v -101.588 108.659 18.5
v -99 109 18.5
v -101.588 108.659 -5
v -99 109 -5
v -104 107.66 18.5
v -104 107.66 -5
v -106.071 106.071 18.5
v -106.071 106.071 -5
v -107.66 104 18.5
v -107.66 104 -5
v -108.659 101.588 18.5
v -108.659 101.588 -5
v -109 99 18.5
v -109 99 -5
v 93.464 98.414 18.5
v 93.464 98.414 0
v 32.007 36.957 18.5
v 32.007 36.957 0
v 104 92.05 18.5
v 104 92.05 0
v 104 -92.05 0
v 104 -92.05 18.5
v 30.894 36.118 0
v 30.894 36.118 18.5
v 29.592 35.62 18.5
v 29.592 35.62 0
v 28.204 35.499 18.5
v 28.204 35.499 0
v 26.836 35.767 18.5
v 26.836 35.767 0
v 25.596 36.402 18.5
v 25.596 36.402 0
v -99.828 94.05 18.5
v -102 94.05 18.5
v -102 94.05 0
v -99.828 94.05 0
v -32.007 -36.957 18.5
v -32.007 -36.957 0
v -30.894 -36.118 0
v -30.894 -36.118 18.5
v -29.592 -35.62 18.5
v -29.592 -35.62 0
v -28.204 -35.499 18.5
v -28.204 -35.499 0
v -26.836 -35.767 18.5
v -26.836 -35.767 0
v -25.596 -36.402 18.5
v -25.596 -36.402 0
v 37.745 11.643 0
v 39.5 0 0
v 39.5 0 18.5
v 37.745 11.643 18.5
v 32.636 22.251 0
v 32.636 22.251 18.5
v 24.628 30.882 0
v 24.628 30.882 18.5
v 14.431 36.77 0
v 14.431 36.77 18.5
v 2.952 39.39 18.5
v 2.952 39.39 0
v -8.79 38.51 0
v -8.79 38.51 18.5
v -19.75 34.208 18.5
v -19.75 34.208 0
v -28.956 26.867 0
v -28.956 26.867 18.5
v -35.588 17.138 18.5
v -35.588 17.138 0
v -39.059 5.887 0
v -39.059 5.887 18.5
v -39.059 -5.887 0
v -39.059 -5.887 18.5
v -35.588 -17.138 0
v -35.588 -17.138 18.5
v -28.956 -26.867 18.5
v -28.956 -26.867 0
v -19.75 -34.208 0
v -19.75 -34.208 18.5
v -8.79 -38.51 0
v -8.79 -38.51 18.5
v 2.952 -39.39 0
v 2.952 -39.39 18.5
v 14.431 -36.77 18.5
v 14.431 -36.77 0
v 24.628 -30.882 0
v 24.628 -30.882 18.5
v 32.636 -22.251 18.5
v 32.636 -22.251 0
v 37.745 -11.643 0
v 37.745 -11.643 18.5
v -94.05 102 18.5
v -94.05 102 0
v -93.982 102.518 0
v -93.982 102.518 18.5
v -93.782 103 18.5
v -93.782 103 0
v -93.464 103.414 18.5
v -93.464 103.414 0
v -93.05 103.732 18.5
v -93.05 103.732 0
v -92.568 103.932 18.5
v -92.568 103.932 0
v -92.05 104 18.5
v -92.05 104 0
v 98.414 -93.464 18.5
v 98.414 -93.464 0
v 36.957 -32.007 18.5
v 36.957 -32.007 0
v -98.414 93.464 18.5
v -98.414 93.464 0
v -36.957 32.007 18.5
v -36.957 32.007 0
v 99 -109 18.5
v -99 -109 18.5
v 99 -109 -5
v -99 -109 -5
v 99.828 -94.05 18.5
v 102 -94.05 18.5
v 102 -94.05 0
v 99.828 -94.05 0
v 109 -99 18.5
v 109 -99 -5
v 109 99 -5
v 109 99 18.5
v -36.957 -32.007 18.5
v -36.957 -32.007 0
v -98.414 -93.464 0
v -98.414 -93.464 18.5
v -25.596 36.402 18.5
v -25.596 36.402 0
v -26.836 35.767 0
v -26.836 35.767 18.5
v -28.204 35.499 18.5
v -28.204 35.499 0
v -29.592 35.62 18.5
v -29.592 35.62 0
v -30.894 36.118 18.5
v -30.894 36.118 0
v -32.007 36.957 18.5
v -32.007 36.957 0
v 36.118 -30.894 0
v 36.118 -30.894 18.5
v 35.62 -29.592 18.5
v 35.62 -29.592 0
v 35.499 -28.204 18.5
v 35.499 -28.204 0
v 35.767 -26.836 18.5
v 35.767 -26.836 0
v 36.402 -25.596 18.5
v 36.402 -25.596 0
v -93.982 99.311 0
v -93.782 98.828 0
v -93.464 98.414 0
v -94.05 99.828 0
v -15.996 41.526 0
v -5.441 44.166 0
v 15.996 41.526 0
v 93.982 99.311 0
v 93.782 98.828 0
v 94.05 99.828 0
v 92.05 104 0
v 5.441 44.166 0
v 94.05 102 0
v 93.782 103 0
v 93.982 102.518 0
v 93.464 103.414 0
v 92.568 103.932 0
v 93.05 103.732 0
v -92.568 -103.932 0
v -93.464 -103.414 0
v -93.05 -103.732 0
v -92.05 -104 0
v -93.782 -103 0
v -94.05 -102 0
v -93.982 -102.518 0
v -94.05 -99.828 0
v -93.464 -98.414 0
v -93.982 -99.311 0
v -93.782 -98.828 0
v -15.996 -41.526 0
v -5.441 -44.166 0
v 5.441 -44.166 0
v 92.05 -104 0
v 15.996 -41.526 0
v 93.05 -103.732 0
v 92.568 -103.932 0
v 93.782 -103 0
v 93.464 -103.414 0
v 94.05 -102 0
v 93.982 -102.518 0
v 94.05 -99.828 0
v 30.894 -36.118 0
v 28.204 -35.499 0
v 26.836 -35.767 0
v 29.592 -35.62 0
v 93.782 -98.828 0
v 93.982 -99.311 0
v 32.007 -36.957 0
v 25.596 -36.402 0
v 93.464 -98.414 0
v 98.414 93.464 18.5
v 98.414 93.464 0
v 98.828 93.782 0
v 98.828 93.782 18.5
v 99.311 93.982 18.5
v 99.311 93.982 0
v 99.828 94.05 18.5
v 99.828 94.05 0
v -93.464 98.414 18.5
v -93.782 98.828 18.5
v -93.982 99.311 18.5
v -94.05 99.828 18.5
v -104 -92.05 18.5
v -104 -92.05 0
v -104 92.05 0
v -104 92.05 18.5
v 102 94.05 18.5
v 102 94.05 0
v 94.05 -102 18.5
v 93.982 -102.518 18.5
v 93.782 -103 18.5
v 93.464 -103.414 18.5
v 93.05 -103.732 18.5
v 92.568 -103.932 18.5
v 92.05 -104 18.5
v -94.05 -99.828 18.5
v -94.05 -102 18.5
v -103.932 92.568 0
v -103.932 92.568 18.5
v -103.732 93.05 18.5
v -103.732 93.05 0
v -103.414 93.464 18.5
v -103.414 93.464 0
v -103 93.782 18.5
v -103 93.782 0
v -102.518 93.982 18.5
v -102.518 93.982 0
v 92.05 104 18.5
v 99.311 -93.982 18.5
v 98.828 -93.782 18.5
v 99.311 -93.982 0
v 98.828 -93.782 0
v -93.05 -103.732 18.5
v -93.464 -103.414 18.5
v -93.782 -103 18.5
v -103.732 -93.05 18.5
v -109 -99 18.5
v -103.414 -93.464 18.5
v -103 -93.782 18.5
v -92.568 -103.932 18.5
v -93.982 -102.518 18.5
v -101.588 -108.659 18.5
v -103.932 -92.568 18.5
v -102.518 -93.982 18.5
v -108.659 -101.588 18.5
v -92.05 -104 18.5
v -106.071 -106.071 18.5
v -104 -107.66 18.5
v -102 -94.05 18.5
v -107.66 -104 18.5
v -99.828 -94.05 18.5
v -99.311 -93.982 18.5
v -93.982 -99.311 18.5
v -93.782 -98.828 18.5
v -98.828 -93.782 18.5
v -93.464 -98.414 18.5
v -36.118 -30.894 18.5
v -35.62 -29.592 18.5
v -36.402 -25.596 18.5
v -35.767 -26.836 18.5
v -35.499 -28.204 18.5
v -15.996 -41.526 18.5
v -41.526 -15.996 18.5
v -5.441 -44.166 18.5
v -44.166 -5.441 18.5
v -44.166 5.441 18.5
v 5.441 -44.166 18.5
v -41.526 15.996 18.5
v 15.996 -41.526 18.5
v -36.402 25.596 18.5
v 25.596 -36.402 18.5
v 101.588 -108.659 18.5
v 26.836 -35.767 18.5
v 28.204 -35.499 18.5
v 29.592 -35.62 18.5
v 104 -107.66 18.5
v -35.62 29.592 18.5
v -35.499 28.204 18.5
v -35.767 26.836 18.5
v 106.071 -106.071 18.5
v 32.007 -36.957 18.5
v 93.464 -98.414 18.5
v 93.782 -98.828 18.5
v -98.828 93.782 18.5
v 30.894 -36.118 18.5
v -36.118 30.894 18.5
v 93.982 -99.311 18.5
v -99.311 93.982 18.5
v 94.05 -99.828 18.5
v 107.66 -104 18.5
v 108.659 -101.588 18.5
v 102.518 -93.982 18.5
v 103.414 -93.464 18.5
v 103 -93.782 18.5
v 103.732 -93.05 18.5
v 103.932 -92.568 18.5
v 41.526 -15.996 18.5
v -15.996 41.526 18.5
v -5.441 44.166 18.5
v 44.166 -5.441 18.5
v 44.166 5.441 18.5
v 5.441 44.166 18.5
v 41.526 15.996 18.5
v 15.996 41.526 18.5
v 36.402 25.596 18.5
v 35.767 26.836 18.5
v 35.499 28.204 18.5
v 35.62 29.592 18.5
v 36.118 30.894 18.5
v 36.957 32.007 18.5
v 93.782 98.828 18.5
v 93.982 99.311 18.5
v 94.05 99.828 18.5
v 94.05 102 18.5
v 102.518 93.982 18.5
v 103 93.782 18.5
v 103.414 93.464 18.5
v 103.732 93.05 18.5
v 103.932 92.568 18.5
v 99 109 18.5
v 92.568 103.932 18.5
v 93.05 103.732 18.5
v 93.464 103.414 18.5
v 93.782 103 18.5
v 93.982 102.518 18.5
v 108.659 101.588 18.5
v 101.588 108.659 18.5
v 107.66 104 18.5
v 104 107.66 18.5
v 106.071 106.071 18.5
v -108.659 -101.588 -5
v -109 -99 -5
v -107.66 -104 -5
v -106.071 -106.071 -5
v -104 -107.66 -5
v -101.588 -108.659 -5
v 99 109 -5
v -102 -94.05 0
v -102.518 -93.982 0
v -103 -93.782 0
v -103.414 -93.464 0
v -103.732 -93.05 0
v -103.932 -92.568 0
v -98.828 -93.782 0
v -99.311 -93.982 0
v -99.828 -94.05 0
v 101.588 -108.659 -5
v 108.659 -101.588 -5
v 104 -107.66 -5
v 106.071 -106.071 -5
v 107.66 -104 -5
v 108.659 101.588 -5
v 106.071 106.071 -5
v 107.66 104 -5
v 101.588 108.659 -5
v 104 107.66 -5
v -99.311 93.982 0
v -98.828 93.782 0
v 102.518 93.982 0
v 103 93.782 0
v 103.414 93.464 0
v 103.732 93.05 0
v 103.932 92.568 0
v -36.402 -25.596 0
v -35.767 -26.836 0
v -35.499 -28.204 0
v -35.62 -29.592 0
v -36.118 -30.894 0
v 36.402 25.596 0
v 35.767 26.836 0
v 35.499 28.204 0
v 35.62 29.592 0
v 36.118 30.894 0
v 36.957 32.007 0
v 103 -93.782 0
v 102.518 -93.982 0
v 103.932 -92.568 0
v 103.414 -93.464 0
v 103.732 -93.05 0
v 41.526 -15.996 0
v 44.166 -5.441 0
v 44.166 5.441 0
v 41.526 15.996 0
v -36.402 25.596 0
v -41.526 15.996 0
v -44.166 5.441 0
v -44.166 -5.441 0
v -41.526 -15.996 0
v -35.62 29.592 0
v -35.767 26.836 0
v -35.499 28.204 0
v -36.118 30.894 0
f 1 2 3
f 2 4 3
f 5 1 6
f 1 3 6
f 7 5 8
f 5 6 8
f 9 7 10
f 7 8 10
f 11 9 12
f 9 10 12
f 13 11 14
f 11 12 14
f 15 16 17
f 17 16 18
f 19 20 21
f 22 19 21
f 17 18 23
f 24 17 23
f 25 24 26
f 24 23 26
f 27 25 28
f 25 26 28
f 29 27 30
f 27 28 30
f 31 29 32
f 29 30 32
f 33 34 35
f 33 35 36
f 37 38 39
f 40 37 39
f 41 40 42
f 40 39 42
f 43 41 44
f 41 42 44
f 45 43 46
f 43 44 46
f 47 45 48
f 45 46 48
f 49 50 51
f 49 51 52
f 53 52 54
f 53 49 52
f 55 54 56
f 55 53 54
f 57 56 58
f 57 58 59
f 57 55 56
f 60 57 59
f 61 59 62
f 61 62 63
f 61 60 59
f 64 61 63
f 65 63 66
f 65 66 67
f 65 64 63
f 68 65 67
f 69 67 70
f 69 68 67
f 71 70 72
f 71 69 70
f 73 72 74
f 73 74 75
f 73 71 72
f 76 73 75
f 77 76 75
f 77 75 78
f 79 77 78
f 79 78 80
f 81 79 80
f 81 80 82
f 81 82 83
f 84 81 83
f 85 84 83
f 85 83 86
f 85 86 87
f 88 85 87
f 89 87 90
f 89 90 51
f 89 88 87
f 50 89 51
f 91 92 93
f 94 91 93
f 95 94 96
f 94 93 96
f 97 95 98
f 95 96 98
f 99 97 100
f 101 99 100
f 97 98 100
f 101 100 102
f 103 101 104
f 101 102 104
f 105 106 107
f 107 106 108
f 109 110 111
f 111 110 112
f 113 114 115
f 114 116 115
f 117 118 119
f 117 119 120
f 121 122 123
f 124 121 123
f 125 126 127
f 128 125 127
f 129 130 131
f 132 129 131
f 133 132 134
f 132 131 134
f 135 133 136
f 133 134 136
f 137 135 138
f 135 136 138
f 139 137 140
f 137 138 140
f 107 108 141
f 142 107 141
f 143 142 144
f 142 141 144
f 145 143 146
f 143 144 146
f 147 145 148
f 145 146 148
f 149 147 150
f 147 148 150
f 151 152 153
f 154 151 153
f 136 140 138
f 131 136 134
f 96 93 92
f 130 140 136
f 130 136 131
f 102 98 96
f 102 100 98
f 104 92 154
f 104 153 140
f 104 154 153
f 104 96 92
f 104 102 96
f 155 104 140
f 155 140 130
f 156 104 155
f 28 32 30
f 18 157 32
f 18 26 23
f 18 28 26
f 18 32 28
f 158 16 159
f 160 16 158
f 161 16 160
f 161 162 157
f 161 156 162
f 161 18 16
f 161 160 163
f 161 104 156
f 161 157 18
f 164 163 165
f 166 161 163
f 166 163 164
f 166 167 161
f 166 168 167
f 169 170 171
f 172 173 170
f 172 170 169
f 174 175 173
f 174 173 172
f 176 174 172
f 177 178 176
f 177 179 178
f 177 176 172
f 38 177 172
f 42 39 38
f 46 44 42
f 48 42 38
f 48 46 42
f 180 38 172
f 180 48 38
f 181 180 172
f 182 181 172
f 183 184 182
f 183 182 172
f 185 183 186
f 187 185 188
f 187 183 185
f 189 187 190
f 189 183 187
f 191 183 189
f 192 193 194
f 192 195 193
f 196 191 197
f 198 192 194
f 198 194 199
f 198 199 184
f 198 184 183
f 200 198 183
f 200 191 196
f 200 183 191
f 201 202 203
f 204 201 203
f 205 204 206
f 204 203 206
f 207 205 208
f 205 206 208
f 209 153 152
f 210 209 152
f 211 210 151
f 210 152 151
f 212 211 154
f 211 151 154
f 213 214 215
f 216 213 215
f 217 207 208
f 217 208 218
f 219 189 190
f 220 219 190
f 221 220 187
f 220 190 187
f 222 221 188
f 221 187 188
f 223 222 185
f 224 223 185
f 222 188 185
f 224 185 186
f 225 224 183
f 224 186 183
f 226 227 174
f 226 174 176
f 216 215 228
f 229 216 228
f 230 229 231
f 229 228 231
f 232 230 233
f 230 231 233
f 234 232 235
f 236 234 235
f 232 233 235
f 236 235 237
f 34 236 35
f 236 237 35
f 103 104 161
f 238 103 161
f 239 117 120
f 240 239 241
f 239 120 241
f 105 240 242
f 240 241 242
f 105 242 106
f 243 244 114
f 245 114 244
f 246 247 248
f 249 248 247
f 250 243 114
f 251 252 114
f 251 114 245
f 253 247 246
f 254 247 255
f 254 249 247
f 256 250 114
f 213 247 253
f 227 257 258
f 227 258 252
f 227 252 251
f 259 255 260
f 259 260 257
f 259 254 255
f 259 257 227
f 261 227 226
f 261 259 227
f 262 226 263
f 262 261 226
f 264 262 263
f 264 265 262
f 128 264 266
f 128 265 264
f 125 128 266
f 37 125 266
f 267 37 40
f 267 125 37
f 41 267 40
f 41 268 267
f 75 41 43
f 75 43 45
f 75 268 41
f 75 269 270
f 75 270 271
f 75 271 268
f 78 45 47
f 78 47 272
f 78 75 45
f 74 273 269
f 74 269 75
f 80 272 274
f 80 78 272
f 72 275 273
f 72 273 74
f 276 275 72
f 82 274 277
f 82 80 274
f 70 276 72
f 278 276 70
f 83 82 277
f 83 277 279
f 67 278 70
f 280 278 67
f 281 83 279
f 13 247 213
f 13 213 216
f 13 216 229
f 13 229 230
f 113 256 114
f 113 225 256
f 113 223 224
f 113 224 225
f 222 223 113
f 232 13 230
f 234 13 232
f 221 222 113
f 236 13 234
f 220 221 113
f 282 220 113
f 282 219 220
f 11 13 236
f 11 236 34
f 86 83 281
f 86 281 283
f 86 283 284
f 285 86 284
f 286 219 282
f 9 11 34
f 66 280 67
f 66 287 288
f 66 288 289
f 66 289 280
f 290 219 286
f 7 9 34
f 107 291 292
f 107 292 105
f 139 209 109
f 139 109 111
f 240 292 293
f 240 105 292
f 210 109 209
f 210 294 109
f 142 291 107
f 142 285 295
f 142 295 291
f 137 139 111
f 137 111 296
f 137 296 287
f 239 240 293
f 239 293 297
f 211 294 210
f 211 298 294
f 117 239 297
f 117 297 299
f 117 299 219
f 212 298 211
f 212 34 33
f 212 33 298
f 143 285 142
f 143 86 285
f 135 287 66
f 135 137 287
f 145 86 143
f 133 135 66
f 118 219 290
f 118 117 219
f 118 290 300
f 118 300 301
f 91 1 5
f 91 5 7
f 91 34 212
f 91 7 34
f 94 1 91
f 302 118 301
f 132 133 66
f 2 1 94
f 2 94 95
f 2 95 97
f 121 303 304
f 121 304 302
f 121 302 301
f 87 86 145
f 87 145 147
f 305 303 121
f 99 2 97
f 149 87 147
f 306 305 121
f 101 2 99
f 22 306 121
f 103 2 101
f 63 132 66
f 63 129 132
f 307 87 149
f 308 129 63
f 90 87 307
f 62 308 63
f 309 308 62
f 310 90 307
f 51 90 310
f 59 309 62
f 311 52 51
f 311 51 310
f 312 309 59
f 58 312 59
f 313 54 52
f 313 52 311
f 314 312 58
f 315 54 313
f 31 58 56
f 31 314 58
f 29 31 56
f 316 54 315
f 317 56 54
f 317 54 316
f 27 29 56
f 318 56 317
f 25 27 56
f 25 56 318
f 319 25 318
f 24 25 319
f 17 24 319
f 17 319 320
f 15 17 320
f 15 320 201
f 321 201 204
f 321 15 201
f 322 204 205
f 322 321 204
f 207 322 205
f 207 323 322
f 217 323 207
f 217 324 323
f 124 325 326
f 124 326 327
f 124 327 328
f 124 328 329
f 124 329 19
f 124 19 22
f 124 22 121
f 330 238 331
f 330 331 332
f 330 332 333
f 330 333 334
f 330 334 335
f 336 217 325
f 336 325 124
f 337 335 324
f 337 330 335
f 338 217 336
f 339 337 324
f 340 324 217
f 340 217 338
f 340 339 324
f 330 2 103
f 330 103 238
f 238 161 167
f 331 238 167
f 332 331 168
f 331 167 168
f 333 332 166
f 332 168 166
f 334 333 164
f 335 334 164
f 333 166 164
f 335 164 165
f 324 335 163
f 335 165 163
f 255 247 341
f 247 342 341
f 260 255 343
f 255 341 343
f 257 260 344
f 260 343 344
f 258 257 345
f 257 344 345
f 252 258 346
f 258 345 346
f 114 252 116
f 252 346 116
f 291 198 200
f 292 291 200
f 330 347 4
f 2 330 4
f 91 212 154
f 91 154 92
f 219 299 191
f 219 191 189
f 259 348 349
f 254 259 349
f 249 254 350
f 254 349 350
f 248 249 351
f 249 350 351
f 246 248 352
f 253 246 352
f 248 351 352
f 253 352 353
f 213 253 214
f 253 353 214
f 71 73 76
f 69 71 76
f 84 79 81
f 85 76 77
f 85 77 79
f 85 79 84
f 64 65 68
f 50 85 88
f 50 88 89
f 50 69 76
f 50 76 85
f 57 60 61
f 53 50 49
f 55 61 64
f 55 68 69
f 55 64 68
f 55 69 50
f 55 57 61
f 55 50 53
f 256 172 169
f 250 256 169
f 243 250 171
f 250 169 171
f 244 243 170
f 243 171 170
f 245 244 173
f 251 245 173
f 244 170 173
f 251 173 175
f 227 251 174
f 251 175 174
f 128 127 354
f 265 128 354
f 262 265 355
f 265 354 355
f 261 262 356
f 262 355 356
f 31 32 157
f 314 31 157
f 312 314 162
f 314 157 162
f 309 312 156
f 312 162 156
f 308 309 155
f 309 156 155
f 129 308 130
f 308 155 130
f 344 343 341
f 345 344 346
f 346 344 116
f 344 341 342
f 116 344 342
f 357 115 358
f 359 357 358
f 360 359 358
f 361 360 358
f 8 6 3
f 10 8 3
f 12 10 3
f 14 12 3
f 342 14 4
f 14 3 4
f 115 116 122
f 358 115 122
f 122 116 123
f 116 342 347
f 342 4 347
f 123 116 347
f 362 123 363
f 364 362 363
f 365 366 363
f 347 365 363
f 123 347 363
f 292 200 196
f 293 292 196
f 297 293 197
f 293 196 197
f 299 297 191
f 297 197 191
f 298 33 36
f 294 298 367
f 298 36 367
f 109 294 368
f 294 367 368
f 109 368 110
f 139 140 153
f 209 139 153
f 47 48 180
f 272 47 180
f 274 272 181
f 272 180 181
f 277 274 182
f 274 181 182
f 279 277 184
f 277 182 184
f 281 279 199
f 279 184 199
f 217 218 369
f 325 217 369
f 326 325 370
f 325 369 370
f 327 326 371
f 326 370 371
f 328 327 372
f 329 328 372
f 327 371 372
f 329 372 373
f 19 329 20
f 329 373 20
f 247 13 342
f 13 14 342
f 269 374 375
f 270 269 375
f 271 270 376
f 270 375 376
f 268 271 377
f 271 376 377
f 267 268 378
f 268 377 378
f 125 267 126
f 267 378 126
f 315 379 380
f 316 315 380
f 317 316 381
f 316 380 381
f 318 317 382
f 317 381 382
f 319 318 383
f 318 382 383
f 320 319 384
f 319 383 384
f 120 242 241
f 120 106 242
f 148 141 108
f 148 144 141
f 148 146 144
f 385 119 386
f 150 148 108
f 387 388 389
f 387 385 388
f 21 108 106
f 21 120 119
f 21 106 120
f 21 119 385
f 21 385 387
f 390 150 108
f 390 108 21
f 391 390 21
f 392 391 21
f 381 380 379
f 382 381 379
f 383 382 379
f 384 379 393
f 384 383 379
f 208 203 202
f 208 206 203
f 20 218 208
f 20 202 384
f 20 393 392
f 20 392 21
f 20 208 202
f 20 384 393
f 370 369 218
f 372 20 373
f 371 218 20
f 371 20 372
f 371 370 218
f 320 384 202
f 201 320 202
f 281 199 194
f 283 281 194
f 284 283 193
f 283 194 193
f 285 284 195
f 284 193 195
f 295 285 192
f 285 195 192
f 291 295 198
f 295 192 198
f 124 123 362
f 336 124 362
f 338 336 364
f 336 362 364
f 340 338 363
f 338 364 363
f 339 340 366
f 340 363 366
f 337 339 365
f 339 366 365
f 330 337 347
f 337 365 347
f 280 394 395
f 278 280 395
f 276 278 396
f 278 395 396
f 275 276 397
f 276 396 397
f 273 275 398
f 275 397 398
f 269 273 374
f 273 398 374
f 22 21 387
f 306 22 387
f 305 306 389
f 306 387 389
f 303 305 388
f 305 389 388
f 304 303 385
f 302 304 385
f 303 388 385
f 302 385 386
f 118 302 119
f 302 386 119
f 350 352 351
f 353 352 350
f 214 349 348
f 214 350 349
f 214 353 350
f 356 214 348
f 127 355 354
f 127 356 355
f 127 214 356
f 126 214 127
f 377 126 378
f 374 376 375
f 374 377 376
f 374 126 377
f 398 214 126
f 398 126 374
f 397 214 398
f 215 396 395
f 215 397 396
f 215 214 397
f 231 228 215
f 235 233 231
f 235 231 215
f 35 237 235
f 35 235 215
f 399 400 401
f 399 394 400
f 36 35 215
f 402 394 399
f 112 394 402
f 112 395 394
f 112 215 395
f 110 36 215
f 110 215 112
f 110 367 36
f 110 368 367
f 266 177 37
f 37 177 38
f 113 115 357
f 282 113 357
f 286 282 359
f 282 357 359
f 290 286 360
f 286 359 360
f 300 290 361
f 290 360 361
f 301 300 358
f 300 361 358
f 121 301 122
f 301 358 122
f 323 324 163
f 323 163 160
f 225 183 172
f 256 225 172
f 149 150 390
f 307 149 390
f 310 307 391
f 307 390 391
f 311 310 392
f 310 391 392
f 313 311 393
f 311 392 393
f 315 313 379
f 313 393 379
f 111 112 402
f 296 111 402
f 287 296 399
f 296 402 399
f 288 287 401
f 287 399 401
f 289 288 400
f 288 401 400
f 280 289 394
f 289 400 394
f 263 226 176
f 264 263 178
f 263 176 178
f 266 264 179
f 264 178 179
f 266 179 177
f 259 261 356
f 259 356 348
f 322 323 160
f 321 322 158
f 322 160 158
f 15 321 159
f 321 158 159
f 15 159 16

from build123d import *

# Parameters (mm, degrees)
F0_R     = 39.5
F1_DEPTH = 5
F2_DEPTH = 18.5


with BuildPart() as f1:
    # F0 (on Top) → F1 (new body)
    with BuildSketch(Plane.XY):
        with BuildLine():
            Line((99, 109), (-99, 109))
            ThreePointArc((-99, 109), (-106.071068, 106.071068), (-109, 99))
            Line((-109, 99), (-109, -99))
            ThreePointArc((-109, -99), (-106.071068, -106.071068), (-99, -109))
            Line((-99, -109), (99, -109))
            ThreePointArc((99, -109), (106.071068, -106.071068), (109, -99))
            Line((109, -99), (109, 99))
            ThreePointArc((109, 99), (106.071068, 106.071068), (99, 109))
        make_face()
        with BuildLine():
            Line((-60.861436, -104.000004), (-92.050256, -104.000004))
            ThreePointArc((-92.050256, -104.000004), (-93.46447, -103.414217), (-94.050256, -102.000004))
            Line((-94.050256, -102.000004), (-94.050256, -99.828431))
            ThreePointArc((-94.050256, -99.828431), (-93.898015, -99.063064), (-93.46447, -98.414217))
            Line((-93.46447, -98.414217), (-32.007006, -36.956753))
            ThreePointArc((-32.007006, -36.956753), (-28.902368, -35.510889), (-25.595565, -36.402157))
            ThreePointArc((-25.595565, -36.402157), (0, -44.5), (25.595565, -36.402157))
            ThreePointArc((25.595565, -36.402157), (28.902368, -35.510889), (32.007006, -36.956753))
            Line((32.007006, -36.956753), (93.46447, -98.414217))
            ThreePointArc((93.46447, -98.414217), (93.898015, -99.063064), (94.050256, -99.828431))
            Line((94.050256, -99.828431), (94.050256, -102.000004))
            ThreePointArc((94.050256, -102.000004), (93.46447, -103.414217), (92.050256, -104.000004))
            Line((92.050256, -104.000004), (60.861436, -104.000004))
            Line((60.861436, -104.000004), (45.861436, -104.000004))
            Line((45.861436, -104.000004), (-45.861436, -104.000004))
            Line((-45.861436, -104.000004), (-60.861436, -104.000004))
        make_face(mode=Mode.SUBTRACT)
        with BuildLine():
            Line((-104.000004, 60.861436), (-104.000004, 92.050256))
            ThreePointArc((-104.000004, 92.050256), (-103.414217, 93.46447), (-102.000004, 94.050256))
            Line((-102.000004, 94.050256), (-99.828431, 94.050256))
            ThreePointArc((-99.828431, 94.050256), (-99.063064, 93.898015), (-98.414217, 93.46447))
            Line((-98.414217, 93.46447), (-36.956753, 32.007006))
            ThreePointArc((-36.956753, 32.007006), (-35.510889, 28.902368), (-36.402157, 25.595565))
            ThreePointArc((-36.402157, 25.595565), (-44.5, 0), (-36.402157, -25.595565))
            ThreePointArc((-36.402157, -25.595565), (-35.510889, -28.902368), (-36.956753, -32.007006))
            Line((-36.956753, -32.007006), (-98.414217, -93.46447))
            ThreePointArc((-98.414217, -93.46447), (-99.063064, -93.898015), (-99.828431, -94.050256))
            Line((-99.828431, -94.050256), (-102.000004, -94.050256))
            ThreePointArc((-102.000004, -94.050256), (-103.414217, -93.46447), (-104.000004, -92.050256))
            Line((-104.000004, -92.050256), (-104.000004, -60.861436))
            Line((-104.000004, -60.861436), (-104.000004, -45.861436))
            Line((-104.000004, -45.861436), (-104.000004, 45.861436))
            Line((-104.000004, 45.861436), (-104.000004, 60.861436))
        make_face(mode=Mode.SUBTRACT)
        with BuildLine():
            ThreePointArc((-94.050256, 102.000004), (-93.46447, 103.414217), (-92.050256, 104.000004))
            Line((-92.050256, 104.000004), (-60.861436, 104.000004))
            Line((-60.861436, 104.000004), (-45.861436, 104.000004))
            Line((-45.861436, 104.000004), (45.861436, 104.000004))
            Line((45.861436, 104.000004), (60.861436, 104.000004))
            Line((60.861436, 104.000004), (92.050256, 104.000004))
            ThreePointArc((92.050256, 104.000004), (93.46447, 103.414217), (94.050256, 102.000004))
            Line((94.050256, 102.000004), (94.050256, 99.828431))
            ThreePointArc((94.050256, 99.828431), (93.898015, 99.063064), (93.46447, 98.414217))
            Line((93.46447, 98.414217), (32.007006, 36.956753))
            ThreePointArc((32.007006, 36.956753), (28.902368, 35.510889), (25.595565, 36.402157))
            ThreePointArc((25.595565, 36.402157), (0, 44.5), (-25.595565, 36.402157))
            ThreePointArc((-25.595565, 36.402157), (-28.902368, 35.510889), (-32.007006, 36.956753))
            Line((-32.007006, 36.956753), (-93.46447, 98.414217))
            ThreePointArc((-93.46447, 98.414217), (-93.898015, 99.063064), (-94.050256, 99.828431))
            Line((-94.050256, 99.828431), (-94.050256, 102.000004))
        make_face(mode=Mode.SUBTRACT)
        Circle(F0_R, mode=Mode.SUBTRACT)
        with BuildLine():
            ThreePointArc((102.000004, 94.050256), (103.414217, 93.46447), (104.000004, 92.050256))
            Line((104.000004, 92.050256), (104.000004, 60.861436))
            Line((104.000004, 60.861436), (104.000004, 45.861436))
            Line((104.000004, 45.861436), (104.000004, -45.861436))
            Line((104.000004, -45.861436), (104.000004, -60.861436))
            Line((104.000004, -60.861436), (104.000004, -92.050256))
            ThreePointArc((104.000004, -92.050256), (103.414217, -93.46447), (102.000004, -94.050256))
            Line((102.000004, -94.050256), (99.828431, -94.050256))
            ThreePointArc((99.828431, -94.050256), (99.063064, -93.898015), (98.414217, -93.46447))
            Line((98.414217, -93.46447), (36.956753, -32.007006))
            ThreePointArc((36.956753, -32.007006), (35.510889, -28.902368), (36.402157, -25.595565))
            ThreePointArc((36.402157, -25.595565), (44.5, 0), (36.402157, 25.595565))
            ThreePointArc((36.402157, 25.595565), (35.510889, 28.902368), (36.956753, 32.007006))
            Line((36.956753, 32.007006), (98.414217, 93.46447))
            ThreePointArc((98.414217, 93.46447), (99.063064, 93.898015), (99.828431, 94.050256))
            Line((99.828431, 94.050256), (102.000004, 94.050256))
        make_face(mode=Mode.SUBTRACT)
        with BuildLine():
            ThreePointArc((-102.000004, 94.050256), (-103.414217, 93.46447), (-104.000004, 92.050256))
            Line((-104.000004, 92.050256), (-104.000004, 60.861436))
            Line((-104.000004, 60.861436), (-104.000004, 45.861436))
            Line((-104.000004, 45.861436), (-104.000004, -45.861436))
            Line((-104.000004, -45.861436), (-104.000004, -60.861436))
            Line((-104.000004, -60.861436), (-104.000004, -92.050256))
            ThreePointArc((-104.000004, -92.050256), (-103.414217, -93.46447), (-102.000004, -94.050256))
            Line((-102.000004, -94.050256), (-99.828431, -94.050256))
            ThreePointArc((-99.828431, -94.050256), (-99.063064, -93.898015), (-98.414217, -93.46447))
            Line((-98.414217, -93.46447), (-36.956753, -32.007006))
            ThreePointArc((-36.956753, -32.007006), (-35.510889, -28.902368), (-36.402157, -25.595565))
            ThreePointArc((-36.402157, -25.595565), (-44.5, 0), (-36.402157, 25.595565))
            ThreePointArc((-36.402157, 25.595565), (-35.510889, 28.902368), (-36.956753, 32.007006))
            Line((-36.956753, 32.007006), (-98.414217, 93.46447))
            ThreePointArc((-98.414217, 93.46447), (-99.063064, 93.898015), (-99.828431, 94.050256))
            Line((-99.828431, 94.050256), (-102.000004, 94.050256))
        make_face()
        with BuildLine():
            Line((-60.861436, 104.000004), (-92.050256, 104.000004))
            ThreePointArc((-92.050256, 104.000004), (-93.46447, 103.414217), (-94.050256, 102.000004))
            Line((-94.050256, 102.000004), (-94.050256, 99.828431))
            ThreePointArc((-94.050256, 99.828431), (-93.898015, 99.063064), (-93.46447, 98.414217))
            Line((-93.46447, 98.414217), (-32.007006, 36.956753))
            ThreePointArc((-32.007006, 36.956753), (-28.902368, 35.510889), (-25.595565, 36.402157))
            ThreePointArc((-25.595565, 36.402157), (0, 44.5), (25.595565, 36.402157))
            ThreePointArc((25.595565, 36.402157), (28.902368, 35.510889), (32.007006, 36.956753))
            Line((32.007006, 36.956753), (93.46447, 98.414217))
            ThreePointArc((93.46447, 98.414217), (93.898015, 99.063064), (94.050256, 99.828431))
            Line((94.050256, 99.828431), (94.050256, 102.000004))
            ThreePointArc((94.050256, 102.000004), (93.46447, 103.414217), (92.050256, 104.000004))
            Line((92.050256, 104.000004), (60.861436, 104.000004))
            Line((60.861436, 104.000004), (45.861436, 104.000004))
            Line((45.861436, 104.000004), (-45.861436, 104.000004))
            Line((-45.861436, 104.000004), (-60.861436, 104.000004))
        make_face()
        Circle(F0_R)
        with BuildLine():
            Line((104.000004, 60.861436), (104.000004, 92.050256))
            ThreePointArc((104.000004, 92.050256), (103.414217, 93.46447), (102.000004, 94.050256))
            Line((102.000004, 94.050256), (99.828431, 94.050256))
            ThreePointArc((99.828431, 94.050256), (99.063064, 93.898015), (98.414217, 93.46447))
            Line((98.414217, 93.46447), (36.956753, 32.007006))
            ThreePointArc((36.956753, 32.007006), (35.510889, 28.902368), (36.402157, 25.595565))
            ThreePointArc((36.402157, 25.595565), (44.5, 0), (36.402157, -25.595565))
            ThreePointArc((36.402157, -25.595565), (35.510889, -28.902368), (36.956753, -32.007006))
            Line((36.956753, -32.007006), (98.414217, -93.46447))
            ThreePointArc((98.414217, -93.46447), (99.063064, -93.898015), (99.828431, -94.050256))
            Line((99.828431, -94.050256), (102.000004, -94.050256))
            ThreePointArc((102.000004, -94.050256), (103.414217, -93.46447), (104.000004, -92.050256))
            Line((104.000004, -92.050256), (104.000004, -60.861436))
            Line((104.000004, -60.861436), (104.000004, -45.861436))
            Line((104.000004, -45.861436), (104.000004, 45.861436))
            Line((104.000004, 45.861436), (104.000004, 60.861436))
        make_face()
        with BuildLine():
            ThreePointArc((-94.050256, -102.000004), (-93.46447, -103.414217), (-92.050256, -104.000004))
            Line((-92.050256, -104.000004), (-60.861436, -104.000004))
            Line((-60.861436, -104.000004), (-45.861436, -104.000004))
            Line((-45.861436, -104.000004), (45.861436, -104.000004))
            Line((45.861436, -104.000004), (60.861436, -104.000004))
            Line((60.861436, -104.000004), (92.050256, -104.000004))
            ThreePointArc((92.050256, -104.000004), (93.46447, -103.414217), (94.050256, -102.000004))
            Line((94.050256, -102.000004), (94.050256, -99.828431))
            ThreePointArc((94.050256, -99.828431), (93.898015, -99.063064), (93.46447, -98.414217))
            Line((93.46447, -98.414217), (32.007006, -36.956753))
            ThreePointArc((32.007006, -36.956753), (28.902368, -35.510889), (25.595565, -36.402157))
            ThreePointArc((25.595565, -36.402157), (0, -44.5), (-25.595565, -36.402157))
            ThreePointArc((-25.595565, -36.402157), (-28.902368, -35.510889), (-32.007006, -36.956753))
            Line((-32.007006, -36.956753), (-93.46447, -98.414217))
            ThreePointArc((-93.46447, -98.414217), (-93.898015, -99.063064), (-94.050256, -99.828431))
            Line((-94.050256, -99.828431), (-94.050256, -102.000004))
        make_face()
    extrude(amount=-F1_DEPTH)

    # F0 (on Top) → F2 (join)
    with BuildSketch(Plane.XY):
        with BuildLine():
            Line((99, 109), (-99, 109))
            ThreePointArc((-99, 109), (-106.071068, 106.071068), (-109, 99))
            Line((-109, 99), (-109, -99))
            ThreePointArc((-109, -99), (-106.071068, -106.071068), (-99, -109))
            Line((-99, -109), (99, -109))
            ThreePointArc((99, -109), (106.071068, -106.071068), (109, -99))
            Line((109, -99), (109, 99))
            ThreePointArc((109, 99), (106.071068, 106.071068), (99, 109))
        make_face()
        with BuildLine():
            Line((-60.861436, -104.000004), (-92.050256, -104.000004))
            ThreePointArc((-92.050256, -104.000004), (-93.46447, -103.414217), (-94.050256, -102.000004))
            Line((-94.050256, -102.000004), (-94.050256, -99.828431))
            ThreePointArc((-94.050256, -99.828431), (-93.898015, -99.063064), (-93.46447, -98.414217))
            Line((-93.46447, -98.414217), (-32.007006, -36.956753))
            ThreePointArc((-32.007006, -36.956753), (-28.902368, -35.510889), (-25.595565, -36.402157))
            ThreePointArc((-25.595565, -36.402157), (0, -44.5), (25.595565, -36.402157))
            ThreePointArc((25.595565, -36.402157), (28.902368, -35.510889), (32.007006, -36.956753))
            Line((32.007006, -36.956753), (93.46447, -98.414217))
            ThreePointArc((93.46447, -98.414217), (93.898015, -99.063064), (94.050256, -99.828431))
            Line((94.050256, -99.828431), (94.050256, -102.000004))
            ThreePointArc((94.050256, -102.000004), (93.46447, -103.414217), (92.050256, -104.000004))
            Line((92.050256, -104.000004), (60.861436, -104.000004))
            Line((60.861436, -104.000004), (45.861436, -104.000004))
            Line((45.861436, -104.000004), (-45.861436, -104.000004))
            Line((-45.861436, -104.000004), (-60.861436, -104.000004))
        make_face(mode=Mode.SUBTRACT)
        with BuildLine():
            Line((-104.000004, 60.861436), (-104.000004, 92.050256))
            ThreePointArc((-104.000004, 92.050256), (-103.414217, 93.46447), (-102.000004, 94.050256))
            Line((-102.000004, 94.050256), (-99.828431, 94.050256))
            ThreePointArc((-99.828431, 94.050256), (-99.063064, 93.898015), (-98.414217, 93.46447))
            Line((-98.414217, 93.46447), (-36.956753, 32.007006))
            ThreePointArc((-36.956753, 32.007006), (-35.510889, 28.902368), (-36.402157, 25.595565))
            ThreePointArc((-36.402157, 25.595565), (-44.5, 0), (-36.402157, -25.595565))
            ThreePointArc((-36.402157, -25.595565), (-35.510889, -28.902368), (-36.956753, -32.007006))
            Line((-36.956753, -32.007006), (-98.414217, -93.46447))
            ThreePointArc((-98.414217, -93.46447), (-99.063064, -93.898015), (-99.828431, -94.050256))
            Line((-99.828431, -94.050256), (-102.000004, -94.050256))
            ThreePointArc((-102.000004, -94.050256), (-103.414217, -93.46447), (-104.000004, -92.050256))
            Line((-104.000004, -92.050256), (-104.000004, -60.861436))
            Line((-104.000004, -60.861436), (-104.000004, -45.861436))
            Line((-104.000004, -45.861436), (-104.000004, 45.861436))
            Line((-104.000004, 45.861436), (-104.000004, 60.861436))
        make_face(mode=Mode.SUBTRACT)
        with BuildLine():
            ThreePointArc((-94.050256, 102.000004), (-93.46447, 103.414217), (-92.050256, 104.000004))
            Line((-92.050256, 104.000004), (-60.861436, 104.000004))
            Line((-60.861436, 104.000004), (-45.861436, 104.000004))
            Line((-45.861436, 104.000004), (45.861436, 104.000004))
            Line((45.861436, 104.000004), (60.861436, 104.000004))
            Line((60.861436, 104.000004), (92.050256, 104.000004))
            ThreePointArc((92.050256, 104.000004), (93.46447, 103.414217), (94.050256, 102.000004))
            Line((94.050256, 102.000004), (94.050256, 99.828431))
            ThreePointArc((94.050256, 99.828431), (93.898015, 99.063064), (93.46447, 98.414217))
            Line((93.46447, 98.414217), (32.007006, 36.956753))
            ThreePointArc((32.007006, 36.956753), (28.902368, 35.510889), (25.595565, 36.402157))
            ThreePointArc((25.595565, 36.402157), (0, 44.5), (-25.595565, 36.402157))
            ThreePointArc((-25.595565, 36.402157), (-28.902368, 35.510889), (-32.007006, 36.956753))
            Line((-32.007006, 36.956753), (-93.46447, 98.414217))
            ThreePointArc((-93.46447, 98.414217), (-93.898015, 99.063064), (-94.050256, 99.828431))
            Line((-94.050256, 99.828431), (-94.050256, 102.000004))
        make_face(mode=Mode.SUBTRACT)
        Circle(F0_R, mode=Mode.SUBTRACT)
        with BuildLine():
            ThreePointArc((102.000004, 94.050256), (103.414217, 93.46447), (104.000004, 92.050256))
            Line((104.000004, 92.050256), (104.000004, 60.861436))
            Line((104.000004, 60.861436), (104.000004, 45.861436))
            Line((104.000004, 45.861436), (104.000004, -45.861436))
            Line((104.000004, -45.861436), (104.000004, -60.861436))
            Line((104.000004, -60.861436), (104.000004, -92.050256))
            ThreePointArc((104.000004, -92.050256), (103.414217, -93.46447), (102.000004, -94.050256))
            Line((102.000004, -94.050256), (99.828431, -94.050256))
            ThreePointArc((99.828431, -94.050256), (99.063064, -93.898015), (98.414217, -93.46447))
            Line((98.414217, -93.46447), (36.956753, -32.007006))
            ThreePointArc((36.956753, -32.007006), (35.510889, -28.902368), (36.402157, -25.595565))
            ThreePointArc((36.402157, -25.595565), (44.5, 0), (36.402157, 25.595565))
            ThreePointArc((36.402157, 25.595565), (35.510889, 28.902368), (36.956753, 32.007006))
            Line((36.956753, 32.007006), (98.414217, 93.46447))
            ThreePointArc((98.414217, 93.46447), (99.063064, 93.898015), (99.828431, 94.050256))
            Line((99.828431, 94.050256), (102.000004, 94.050256))
        make_face(mode=Mode.SUBTRACT)
    extrude(amount=F2_DEPTH)


solid = f1.part
